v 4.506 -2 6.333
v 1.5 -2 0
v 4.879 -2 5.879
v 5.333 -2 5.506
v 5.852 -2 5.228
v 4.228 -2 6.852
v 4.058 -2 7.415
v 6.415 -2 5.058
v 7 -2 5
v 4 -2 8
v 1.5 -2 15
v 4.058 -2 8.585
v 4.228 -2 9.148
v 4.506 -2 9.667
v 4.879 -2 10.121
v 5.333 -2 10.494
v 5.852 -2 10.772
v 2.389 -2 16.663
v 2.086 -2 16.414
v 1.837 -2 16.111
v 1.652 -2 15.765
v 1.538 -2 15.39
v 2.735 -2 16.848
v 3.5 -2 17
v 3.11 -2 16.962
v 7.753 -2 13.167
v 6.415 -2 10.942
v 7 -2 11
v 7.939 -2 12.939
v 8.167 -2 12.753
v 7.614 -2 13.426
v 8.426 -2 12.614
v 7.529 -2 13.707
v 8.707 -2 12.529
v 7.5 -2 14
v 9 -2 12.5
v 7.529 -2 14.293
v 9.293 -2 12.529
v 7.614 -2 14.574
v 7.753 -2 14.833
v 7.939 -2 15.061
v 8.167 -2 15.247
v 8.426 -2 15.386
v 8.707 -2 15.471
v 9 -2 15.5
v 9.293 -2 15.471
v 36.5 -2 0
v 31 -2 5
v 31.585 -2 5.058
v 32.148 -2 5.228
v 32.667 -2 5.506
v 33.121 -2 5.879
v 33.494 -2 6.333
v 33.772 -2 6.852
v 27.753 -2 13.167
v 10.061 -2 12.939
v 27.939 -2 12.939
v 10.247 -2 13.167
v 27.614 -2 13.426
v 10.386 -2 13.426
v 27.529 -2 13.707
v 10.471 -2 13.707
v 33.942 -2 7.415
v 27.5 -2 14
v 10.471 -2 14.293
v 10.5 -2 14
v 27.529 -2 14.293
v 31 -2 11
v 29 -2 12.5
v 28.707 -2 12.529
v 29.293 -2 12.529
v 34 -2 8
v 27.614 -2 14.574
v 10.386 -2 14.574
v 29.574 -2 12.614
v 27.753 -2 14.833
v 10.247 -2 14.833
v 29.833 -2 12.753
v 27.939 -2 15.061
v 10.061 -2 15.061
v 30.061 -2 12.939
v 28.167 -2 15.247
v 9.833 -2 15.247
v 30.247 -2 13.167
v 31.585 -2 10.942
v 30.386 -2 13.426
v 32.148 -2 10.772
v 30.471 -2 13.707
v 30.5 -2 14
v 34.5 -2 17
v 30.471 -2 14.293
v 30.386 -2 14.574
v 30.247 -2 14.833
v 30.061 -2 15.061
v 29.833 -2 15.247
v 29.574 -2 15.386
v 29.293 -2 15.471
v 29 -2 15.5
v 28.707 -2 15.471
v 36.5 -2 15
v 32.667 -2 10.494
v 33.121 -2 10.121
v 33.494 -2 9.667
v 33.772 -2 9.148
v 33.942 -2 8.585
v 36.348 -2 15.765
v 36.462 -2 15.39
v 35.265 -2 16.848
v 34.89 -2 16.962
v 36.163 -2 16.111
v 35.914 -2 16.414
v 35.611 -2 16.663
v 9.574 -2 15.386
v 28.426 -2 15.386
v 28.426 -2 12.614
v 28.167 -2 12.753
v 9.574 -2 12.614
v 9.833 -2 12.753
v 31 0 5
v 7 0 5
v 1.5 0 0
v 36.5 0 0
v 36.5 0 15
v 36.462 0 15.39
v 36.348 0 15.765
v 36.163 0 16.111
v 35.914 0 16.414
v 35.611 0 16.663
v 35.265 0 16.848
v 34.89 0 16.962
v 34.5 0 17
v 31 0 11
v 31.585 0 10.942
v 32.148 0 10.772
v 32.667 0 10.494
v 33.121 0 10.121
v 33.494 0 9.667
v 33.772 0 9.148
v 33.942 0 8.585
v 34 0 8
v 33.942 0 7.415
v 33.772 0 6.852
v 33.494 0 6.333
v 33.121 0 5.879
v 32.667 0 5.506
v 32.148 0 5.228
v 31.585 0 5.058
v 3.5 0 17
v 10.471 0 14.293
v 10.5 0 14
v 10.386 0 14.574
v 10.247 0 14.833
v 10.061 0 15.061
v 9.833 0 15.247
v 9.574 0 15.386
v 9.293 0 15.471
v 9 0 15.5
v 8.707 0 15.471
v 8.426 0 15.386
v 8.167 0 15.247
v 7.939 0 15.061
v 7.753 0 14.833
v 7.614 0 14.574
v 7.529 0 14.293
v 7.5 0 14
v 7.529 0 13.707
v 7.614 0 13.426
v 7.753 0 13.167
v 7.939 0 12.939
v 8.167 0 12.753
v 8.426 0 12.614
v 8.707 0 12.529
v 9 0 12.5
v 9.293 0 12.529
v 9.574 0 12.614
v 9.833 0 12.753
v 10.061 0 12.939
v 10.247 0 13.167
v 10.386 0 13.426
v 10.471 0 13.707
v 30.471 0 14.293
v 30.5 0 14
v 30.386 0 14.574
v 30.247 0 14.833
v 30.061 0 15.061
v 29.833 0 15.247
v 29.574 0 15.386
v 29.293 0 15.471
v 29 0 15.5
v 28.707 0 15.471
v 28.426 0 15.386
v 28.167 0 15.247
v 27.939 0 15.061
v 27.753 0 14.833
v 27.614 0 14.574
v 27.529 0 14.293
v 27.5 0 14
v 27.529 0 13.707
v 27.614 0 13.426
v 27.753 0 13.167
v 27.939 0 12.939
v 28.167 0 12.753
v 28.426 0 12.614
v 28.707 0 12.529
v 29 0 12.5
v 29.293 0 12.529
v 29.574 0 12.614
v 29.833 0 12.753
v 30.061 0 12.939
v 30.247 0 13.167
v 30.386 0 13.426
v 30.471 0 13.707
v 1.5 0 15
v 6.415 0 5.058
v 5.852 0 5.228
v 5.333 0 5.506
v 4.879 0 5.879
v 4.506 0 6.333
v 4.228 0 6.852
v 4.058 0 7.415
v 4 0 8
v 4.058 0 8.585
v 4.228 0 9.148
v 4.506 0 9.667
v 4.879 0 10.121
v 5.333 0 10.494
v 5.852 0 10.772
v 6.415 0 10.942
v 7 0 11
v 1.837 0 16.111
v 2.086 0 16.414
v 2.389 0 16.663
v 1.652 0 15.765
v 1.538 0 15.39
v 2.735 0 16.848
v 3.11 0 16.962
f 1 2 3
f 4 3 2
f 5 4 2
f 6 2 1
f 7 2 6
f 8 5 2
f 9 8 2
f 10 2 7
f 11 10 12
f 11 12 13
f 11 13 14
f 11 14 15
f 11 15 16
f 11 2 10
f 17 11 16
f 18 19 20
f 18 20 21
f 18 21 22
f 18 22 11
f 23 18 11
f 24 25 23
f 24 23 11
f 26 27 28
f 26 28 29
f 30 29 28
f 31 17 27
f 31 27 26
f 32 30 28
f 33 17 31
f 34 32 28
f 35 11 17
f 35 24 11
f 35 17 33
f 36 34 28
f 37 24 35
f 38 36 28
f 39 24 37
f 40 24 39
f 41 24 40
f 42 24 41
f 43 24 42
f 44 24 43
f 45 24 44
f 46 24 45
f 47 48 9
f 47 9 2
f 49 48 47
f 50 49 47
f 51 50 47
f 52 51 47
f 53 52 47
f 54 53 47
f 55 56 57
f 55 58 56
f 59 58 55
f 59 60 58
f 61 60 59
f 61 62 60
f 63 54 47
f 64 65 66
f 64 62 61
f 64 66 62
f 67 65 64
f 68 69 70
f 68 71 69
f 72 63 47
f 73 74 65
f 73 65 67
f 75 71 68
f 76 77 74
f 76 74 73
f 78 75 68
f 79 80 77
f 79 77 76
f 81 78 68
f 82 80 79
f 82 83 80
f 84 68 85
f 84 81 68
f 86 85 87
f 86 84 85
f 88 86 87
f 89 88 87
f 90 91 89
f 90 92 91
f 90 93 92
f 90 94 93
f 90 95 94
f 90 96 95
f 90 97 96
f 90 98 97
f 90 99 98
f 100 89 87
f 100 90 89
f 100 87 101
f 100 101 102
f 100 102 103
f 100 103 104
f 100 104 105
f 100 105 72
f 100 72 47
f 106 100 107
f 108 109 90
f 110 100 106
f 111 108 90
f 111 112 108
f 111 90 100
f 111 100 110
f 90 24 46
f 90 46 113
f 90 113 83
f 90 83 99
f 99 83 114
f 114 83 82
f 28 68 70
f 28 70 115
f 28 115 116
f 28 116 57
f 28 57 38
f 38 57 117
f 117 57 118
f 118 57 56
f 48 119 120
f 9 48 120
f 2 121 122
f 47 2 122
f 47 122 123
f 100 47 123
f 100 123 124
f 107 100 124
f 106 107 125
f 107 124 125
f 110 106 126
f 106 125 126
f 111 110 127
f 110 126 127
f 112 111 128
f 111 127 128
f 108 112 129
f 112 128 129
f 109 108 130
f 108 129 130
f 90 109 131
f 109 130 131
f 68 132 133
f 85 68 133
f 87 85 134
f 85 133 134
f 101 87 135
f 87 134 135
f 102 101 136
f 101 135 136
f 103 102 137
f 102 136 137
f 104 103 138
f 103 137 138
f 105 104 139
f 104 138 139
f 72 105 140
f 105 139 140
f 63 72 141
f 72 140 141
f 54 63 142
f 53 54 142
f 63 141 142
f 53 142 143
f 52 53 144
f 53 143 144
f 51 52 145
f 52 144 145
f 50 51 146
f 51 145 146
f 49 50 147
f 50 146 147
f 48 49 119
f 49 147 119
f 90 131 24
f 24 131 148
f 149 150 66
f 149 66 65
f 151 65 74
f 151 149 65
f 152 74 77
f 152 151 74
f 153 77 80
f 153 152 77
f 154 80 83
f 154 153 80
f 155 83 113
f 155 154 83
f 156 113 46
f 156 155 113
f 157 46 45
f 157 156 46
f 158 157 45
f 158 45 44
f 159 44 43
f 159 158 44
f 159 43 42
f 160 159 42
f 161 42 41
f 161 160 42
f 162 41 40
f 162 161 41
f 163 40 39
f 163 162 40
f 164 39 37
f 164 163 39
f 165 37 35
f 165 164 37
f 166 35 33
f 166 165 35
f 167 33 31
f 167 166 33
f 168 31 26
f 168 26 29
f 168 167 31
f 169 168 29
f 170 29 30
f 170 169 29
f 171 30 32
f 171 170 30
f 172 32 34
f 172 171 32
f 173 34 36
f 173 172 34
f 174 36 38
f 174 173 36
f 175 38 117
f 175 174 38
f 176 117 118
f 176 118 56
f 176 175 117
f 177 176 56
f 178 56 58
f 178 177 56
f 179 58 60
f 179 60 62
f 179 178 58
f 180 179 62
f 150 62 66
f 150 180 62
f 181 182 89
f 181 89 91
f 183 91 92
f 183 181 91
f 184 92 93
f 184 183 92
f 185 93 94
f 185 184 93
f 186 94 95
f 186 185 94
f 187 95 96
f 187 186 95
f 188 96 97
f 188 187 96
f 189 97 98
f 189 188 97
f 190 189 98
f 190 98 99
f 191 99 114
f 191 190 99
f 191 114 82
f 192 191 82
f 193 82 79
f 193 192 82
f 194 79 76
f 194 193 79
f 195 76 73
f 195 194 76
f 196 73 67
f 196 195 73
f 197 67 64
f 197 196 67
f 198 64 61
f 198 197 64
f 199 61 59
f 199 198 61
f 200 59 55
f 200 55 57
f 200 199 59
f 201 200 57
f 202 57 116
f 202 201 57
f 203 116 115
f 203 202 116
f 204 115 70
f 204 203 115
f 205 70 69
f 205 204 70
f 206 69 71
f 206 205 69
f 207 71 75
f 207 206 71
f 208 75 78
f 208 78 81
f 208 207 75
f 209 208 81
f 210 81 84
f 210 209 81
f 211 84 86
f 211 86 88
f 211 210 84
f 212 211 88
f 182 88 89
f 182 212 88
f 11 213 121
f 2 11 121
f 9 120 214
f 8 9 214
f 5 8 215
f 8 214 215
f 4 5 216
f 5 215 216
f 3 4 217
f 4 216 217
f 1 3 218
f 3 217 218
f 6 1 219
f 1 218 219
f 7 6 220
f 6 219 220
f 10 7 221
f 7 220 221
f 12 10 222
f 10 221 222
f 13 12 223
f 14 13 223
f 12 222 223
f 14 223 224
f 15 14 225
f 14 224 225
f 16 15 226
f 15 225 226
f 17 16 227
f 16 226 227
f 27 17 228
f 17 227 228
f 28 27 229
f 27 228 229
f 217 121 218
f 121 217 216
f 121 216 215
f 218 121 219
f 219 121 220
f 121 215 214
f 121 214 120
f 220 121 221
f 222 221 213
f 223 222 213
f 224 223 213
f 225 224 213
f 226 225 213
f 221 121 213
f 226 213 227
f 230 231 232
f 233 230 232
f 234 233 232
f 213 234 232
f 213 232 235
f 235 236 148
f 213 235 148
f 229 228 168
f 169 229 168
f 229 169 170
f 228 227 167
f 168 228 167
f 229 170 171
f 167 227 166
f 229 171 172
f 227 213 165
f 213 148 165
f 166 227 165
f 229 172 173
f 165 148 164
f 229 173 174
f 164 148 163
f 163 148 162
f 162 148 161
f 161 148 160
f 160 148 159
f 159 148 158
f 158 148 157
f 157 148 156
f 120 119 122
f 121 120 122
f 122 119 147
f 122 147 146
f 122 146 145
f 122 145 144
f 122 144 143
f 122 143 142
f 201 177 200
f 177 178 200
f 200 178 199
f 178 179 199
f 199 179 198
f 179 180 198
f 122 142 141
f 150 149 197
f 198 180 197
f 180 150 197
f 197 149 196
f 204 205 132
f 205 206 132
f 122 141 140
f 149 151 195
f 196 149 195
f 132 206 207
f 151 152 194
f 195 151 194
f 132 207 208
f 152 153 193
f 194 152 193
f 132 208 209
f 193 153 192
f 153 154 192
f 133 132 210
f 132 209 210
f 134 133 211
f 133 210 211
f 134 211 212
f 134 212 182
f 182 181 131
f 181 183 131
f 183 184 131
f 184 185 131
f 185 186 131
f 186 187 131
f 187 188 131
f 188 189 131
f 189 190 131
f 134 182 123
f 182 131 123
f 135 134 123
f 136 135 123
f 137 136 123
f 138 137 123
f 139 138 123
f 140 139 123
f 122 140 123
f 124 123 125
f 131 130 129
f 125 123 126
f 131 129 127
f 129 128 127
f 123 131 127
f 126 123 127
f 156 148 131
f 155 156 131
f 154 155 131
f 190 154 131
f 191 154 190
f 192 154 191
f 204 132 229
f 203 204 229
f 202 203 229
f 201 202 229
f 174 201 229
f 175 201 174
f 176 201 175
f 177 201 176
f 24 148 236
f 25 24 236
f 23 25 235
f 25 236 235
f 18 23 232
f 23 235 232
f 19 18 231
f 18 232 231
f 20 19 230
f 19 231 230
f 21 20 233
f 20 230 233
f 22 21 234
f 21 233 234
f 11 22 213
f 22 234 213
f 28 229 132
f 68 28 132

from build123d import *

# Parameters (mm, degrees)
F0_R     = 1.5
F1_DEPTH = 2


with BuildPart() as f1:
    # F0 (on Front) → F1 (new body)
    with BuildSketch(Plane.XZ):
        with BuildLine():
            Line((34.5, 17), (3.5, 17))
            ThreePointArc((3.5, 17), (2.085786, 16.414214), (1.5, 15))
            Line((1.5, 15), (1.5, 0))
            Line((1.5, 0), (36.5, 0))
            Line((36.5, 0), (36.5, 15))
            ThreePointArc((36.5, 15), (35.914214, 16.414214), (34.5, 17))
        make_face()
        with BuildLine():
            ThreePointArc((7, 5), (4, 8), (7, 11))
            Line((7, 11), (31, 11))
            ThreePointArc((31, 11), (34, 8), (31, 5))
            Line((31, 5), (7, 5))
        make_face(mode=Mode.SUBTRACT)
        with Locations((9, 14)):
            Circle(F0_R, mode=Mode.SUBTRACT)
        with Locations((29, 14)):
            Circle(F0_R, mode=Mode.SUBTRACT)
    extrude(amount=F1_DEPTH)


solid = f1.part
